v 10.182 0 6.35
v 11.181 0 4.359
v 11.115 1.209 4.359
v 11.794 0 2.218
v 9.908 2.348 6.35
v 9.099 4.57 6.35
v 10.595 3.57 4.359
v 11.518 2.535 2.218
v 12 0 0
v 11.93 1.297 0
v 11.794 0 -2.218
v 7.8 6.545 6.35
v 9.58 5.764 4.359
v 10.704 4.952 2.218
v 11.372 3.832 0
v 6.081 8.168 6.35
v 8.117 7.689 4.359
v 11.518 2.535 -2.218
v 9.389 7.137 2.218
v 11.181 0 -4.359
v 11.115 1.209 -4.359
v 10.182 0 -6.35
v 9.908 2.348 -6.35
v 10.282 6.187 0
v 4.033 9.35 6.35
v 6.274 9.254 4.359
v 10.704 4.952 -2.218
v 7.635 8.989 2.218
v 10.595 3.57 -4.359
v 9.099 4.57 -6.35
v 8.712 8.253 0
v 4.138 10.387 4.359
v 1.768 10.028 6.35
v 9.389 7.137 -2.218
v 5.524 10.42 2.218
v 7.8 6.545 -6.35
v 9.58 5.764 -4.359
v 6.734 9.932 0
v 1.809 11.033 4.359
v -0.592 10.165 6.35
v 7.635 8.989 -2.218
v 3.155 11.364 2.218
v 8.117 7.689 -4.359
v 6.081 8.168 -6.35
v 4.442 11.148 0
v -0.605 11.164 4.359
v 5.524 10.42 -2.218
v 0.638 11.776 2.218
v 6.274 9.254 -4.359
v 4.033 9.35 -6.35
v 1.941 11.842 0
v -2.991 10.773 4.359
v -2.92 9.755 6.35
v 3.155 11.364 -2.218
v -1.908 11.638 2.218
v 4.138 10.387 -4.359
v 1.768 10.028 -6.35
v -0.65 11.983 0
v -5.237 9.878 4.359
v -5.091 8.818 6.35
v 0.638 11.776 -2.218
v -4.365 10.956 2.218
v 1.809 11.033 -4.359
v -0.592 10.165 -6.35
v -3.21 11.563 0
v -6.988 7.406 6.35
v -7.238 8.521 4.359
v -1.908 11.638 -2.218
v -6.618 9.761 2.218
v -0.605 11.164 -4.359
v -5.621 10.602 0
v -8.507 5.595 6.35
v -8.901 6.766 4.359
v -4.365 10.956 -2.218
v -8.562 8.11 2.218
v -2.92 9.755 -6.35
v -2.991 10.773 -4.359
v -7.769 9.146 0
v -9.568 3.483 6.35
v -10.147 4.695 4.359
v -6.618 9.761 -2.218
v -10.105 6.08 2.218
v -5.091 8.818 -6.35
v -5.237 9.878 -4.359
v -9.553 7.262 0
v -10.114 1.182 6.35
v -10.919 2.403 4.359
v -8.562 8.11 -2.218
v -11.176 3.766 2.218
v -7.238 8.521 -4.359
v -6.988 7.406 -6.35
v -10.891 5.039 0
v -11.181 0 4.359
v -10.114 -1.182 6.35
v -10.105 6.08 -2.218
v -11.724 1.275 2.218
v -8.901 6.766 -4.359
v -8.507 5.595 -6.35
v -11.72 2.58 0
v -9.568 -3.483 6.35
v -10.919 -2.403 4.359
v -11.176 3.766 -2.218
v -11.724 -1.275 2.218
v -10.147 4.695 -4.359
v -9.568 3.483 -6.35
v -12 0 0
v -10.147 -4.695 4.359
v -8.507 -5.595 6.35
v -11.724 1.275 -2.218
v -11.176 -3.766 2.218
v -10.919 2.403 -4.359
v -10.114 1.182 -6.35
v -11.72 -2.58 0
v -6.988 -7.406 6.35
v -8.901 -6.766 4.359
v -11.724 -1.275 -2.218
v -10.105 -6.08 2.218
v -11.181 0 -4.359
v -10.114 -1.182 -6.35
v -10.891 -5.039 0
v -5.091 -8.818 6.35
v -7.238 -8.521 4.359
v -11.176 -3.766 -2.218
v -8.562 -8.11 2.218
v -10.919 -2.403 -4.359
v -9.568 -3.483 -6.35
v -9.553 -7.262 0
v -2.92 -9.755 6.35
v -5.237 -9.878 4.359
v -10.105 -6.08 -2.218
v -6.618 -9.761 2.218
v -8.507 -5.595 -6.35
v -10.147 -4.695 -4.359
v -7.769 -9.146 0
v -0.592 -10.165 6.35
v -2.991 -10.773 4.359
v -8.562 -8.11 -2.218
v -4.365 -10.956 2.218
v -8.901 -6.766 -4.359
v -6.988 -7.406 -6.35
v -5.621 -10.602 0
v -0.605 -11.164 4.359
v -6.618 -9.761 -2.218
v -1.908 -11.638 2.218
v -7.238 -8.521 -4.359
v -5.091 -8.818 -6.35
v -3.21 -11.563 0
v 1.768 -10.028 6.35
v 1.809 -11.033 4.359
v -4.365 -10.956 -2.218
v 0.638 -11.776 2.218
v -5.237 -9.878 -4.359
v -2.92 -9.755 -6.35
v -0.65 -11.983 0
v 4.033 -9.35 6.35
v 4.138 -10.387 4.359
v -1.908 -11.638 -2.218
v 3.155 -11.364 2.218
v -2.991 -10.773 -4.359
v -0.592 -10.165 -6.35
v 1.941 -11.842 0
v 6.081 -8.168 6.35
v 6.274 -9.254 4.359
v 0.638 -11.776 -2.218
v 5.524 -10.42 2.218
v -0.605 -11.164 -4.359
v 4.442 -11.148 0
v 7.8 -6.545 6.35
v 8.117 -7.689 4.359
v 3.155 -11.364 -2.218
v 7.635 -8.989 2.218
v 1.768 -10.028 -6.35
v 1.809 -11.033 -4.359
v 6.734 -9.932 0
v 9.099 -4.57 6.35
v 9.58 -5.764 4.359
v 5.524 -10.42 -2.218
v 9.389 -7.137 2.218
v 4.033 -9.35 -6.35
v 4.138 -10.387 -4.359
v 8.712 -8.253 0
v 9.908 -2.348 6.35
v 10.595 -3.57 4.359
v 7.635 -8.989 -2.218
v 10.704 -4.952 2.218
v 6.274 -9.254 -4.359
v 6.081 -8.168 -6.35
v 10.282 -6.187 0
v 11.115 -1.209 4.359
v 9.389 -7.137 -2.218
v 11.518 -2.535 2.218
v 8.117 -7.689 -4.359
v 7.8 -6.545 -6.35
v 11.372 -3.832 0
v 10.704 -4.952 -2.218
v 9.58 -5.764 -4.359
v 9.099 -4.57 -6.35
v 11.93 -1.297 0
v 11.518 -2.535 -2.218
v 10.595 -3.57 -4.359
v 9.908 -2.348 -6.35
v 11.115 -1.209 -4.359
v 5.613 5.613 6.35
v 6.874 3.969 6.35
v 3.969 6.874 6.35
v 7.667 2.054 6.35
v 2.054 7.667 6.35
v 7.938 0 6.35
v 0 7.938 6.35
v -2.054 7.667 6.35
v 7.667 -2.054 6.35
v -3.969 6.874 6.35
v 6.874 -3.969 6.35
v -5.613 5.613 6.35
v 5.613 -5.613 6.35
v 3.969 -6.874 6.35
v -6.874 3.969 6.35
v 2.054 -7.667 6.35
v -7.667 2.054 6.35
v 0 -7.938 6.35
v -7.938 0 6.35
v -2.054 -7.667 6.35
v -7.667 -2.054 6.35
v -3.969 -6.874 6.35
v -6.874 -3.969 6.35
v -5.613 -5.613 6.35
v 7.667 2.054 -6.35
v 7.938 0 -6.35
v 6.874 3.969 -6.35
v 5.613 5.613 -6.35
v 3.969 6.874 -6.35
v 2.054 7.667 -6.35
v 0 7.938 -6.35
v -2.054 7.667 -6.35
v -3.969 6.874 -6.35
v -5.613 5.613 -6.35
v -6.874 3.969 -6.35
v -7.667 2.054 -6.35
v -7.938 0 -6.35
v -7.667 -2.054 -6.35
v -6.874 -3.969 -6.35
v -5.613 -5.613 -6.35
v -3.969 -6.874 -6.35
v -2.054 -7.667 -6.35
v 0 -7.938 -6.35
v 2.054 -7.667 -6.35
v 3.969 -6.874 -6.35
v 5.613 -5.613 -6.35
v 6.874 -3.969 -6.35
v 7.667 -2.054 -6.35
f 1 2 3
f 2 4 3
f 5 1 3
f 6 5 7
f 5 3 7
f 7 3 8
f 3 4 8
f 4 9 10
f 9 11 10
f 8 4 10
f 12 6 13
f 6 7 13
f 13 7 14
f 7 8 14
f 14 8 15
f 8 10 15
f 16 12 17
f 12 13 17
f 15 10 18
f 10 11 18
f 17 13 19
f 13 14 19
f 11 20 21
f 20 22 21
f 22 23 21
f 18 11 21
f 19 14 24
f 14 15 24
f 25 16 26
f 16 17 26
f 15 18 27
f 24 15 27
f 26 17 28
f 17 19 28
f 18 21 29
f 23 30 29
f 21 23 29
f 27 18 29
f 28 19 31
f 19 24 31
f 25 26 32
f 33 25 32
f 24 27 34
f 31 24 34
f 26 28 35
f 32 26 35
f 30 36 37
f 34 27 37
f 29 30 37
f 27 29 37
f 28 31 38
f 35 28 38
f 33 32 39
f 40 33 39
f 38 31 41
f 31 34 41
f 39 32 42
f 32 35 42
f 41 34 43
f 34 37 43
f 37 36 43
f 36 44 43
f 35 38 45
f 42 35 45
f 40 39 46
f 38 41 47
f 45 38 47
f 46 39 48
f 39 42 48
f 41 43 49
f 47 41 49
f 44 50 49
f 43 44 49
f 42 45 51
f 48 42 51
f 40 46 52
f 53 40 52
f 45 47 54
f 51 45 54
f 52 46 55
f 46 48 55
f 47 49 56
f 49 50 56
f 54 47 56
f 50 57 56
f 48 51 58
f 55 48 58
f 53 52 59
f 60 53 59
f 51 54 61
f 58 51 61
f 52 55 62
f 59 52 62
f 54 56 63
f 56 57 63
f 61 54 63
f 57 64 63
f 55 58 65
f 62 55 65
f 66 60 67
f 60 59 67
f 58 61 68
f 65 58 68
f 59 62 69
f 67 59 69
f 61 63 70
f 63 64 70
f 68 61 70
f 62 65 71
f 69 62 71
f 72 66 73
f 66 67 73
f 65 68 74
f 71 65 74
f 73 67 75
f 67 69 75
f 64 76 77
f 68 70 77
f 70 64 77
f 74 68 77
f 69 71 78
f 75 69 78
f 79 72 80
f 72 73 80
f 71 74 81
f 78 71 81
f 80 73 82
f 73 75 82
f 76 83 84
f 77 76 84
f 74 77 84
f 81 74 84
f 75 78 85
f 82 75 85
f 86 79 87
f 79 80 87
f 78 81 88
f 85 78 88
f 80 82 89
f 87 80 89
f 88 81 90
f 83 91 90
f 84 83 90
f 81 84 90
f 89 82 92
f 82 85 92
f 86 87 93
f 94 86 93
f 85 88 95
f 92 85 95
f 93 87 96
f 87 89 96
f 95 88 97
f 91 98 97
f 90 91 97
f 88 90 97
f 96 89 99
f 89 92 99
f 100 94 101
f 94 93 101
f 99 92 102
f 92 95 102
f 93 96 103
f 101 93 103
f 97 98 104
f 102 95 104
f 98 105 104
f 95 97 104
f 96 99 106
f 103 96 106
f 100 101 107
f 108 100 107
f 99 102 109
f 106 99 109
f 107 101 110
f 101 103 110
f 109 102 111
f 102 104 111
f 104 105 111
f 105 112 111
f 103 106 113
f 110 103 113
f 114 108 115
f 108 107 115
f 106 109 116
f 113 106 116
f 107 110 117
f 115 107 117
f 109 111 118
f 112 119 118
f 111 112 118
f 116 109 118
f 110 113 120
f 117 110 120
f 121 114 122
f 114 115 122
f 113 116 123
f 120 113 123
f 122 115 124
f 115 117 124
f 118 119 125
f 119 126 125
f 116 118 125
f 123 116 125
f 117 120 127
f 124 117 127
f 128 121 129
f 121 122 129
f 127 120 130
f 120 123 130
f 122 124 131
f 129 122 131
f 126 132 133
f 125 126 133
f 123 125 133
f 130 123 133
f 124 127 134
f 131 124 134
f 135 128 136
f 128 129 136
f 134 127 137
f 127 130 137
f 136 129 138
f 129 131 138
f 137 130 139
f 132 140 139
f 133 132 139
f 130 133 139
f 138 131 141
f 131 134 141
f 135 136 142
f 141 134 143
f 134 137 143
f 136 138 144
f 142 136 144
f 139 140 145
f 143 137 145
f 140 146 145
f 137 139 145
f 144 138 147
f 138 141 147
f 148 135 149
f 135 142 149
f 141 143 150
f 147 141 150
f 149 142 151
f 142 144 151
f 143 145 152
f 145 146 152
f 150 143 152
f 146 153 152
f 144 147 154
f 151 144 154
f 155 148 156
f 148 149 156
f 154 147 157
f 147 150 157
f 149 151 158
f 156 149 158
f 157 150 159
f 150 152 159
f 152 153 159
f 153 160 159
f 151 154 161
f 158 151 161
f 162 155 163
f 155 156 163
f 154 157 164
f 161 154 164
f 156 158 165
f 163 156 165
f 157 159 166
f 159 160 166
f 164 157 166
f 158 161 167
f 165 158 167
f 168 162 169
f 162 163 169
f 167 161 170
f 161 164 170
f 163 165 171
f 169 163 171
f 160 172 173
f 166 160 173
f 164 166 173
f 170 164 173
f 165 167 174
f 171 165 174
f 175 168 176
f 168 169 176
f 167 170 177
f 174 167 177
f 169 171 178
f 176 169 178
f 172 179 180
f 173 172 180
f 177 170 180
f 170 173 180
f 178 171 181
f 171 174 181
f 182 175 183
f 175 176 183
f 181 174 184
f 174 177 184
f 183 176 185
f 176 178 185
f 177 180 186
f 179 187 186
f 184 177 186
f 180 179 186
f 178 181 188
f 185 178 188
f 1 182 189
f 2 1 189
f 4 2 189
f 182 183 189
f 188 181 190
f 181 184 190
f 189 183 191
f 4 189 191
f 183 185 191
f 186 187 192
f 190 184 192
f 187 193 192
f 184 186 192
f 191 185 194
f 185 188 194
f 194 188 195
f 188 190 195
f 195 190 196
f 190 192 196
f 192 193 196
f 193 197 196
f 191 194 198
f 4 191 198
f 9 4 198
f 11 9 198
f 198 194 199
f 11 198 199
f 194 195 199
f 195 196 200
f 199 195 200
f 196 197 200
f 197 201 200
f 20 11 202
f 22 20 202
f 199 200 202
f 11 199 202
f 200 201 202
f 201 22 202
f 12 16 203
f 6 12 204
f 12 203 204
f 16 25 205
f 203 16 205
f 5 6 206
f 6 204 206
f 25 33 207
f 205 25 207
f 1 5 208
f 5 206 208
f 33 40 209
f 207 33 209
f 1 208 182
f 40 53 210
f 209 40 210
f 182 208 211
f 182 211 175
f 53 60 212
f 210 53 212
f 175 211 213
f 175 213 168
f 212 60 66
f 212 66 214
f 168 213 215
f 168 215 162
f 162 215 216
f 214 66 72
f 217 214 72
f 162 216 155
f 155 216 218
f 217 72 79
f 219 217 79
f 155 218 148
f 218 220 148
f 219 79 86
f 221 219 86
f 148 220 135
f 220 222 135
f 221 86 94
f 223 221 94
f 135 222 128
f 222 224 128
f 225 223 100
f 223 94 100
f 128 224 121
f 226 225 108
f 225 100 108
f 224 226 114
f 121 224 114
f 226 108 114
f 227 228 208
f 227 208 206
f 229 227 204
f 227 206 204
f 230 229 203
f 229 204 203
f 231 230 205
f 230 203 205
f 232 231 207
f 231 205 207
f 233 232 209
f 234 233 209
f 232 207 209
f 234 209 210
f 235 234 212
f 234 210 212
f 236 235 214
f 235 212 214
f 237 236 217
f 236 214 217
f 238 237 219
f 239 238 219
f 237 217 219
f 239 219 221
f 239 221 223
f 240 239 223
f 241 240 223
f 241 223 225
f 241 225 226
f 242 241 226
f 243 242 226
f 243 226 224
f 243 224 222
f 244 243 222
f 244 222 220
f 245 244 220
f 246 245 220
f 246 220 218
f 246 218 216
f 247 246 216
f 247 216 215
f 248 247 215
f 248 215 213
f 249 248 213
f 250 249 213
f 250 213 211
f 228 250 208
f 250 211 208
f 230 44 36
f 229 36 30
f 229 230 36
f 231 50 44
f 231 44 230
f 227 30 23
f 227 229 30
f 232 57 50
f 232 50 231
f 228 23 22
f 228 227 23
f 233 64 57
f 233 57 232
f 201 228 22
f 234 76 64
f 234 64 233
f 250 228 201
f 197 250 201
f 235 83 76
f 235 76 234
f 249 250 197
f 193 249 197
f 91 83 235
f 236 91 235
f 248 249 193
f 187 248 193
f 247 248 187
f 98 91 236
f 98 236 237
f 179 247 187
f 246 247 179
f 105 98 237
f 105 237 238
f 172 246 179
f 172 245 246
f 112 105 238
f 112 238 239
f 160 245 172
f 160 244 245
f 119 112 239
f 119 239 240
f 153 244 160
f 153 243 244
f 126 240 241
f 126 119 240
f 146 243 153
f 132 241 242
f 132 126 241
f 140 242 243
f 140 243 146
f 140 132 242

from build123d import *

# Parameters (mm, degrees)
CUT_EXTRUDE1_DEPTH      = 13.00023
CUT_EXTRUDE1_DEPTH_BACK = 13.00023
SKETCH3_R               = 7.9375
CUT_EXTRUDE3_DEPTH      = 13.7


with BuildPart() as part:
    # Sketch1 → Revolve1 (revolve)
    with BuildSketch(Plane(origin=(0, 0, 0), x_dir=(1, 0, 0), z_dir=(0, 1, 0))):
        with BuildLine():
            Line((0, 12.00023), (0, -12.00023))
            ThreePointArc((0, -12.00023), (12.00023, 0), (0, 12.00023))
        make_face()
    revolve(axis=Axis((0, 0, -16.515997735), (0, 0, 1)))

    # Sketch2 → Cut-Extrude1 (cut, two sides)
    with BuildSketch(Plane(origin=(0, 0, 0), x_dir=(0, 0, -1), z_dir=(1, 0, 0))) as cut_extrude1_sk:
        with BuildLine():
            Line((-6.35, 10.182485947), (-6.35, -10.182485947))
            ThreePointArc((-6.35, -10.182485947), (-12.00023, 0), (-6.35, 10.182485947))
        make_face()
        with BuildLine():
            ThreePointArc((6.35, -10.182485947), (12.00023, 0), (6.35, 10.182485947))
            Line((6.35, 10.182485947), (6.35, -10.182485947))
        make_face()
    extrude(amount=CUT_EXTRUDE1_DEPTH, mode=Mode.SUBTRACT)
    extrude(cut_extrude1_sk.sketch, amount=-CUT_EXTRUDE1_DEPTH_BACK, mode=Mode.SUBTRACT)

    # Sketch3 → Cut-Extrude3 (cut, through all)
    with BuildSketch(Plane.XY.offset(6.35)):
        Circle(SKETCH3_R)
    extrude(amount=-CUT_EXTRUDE3_DEPTH, mode=Mode.SUBTRACT)


solid = part.part
